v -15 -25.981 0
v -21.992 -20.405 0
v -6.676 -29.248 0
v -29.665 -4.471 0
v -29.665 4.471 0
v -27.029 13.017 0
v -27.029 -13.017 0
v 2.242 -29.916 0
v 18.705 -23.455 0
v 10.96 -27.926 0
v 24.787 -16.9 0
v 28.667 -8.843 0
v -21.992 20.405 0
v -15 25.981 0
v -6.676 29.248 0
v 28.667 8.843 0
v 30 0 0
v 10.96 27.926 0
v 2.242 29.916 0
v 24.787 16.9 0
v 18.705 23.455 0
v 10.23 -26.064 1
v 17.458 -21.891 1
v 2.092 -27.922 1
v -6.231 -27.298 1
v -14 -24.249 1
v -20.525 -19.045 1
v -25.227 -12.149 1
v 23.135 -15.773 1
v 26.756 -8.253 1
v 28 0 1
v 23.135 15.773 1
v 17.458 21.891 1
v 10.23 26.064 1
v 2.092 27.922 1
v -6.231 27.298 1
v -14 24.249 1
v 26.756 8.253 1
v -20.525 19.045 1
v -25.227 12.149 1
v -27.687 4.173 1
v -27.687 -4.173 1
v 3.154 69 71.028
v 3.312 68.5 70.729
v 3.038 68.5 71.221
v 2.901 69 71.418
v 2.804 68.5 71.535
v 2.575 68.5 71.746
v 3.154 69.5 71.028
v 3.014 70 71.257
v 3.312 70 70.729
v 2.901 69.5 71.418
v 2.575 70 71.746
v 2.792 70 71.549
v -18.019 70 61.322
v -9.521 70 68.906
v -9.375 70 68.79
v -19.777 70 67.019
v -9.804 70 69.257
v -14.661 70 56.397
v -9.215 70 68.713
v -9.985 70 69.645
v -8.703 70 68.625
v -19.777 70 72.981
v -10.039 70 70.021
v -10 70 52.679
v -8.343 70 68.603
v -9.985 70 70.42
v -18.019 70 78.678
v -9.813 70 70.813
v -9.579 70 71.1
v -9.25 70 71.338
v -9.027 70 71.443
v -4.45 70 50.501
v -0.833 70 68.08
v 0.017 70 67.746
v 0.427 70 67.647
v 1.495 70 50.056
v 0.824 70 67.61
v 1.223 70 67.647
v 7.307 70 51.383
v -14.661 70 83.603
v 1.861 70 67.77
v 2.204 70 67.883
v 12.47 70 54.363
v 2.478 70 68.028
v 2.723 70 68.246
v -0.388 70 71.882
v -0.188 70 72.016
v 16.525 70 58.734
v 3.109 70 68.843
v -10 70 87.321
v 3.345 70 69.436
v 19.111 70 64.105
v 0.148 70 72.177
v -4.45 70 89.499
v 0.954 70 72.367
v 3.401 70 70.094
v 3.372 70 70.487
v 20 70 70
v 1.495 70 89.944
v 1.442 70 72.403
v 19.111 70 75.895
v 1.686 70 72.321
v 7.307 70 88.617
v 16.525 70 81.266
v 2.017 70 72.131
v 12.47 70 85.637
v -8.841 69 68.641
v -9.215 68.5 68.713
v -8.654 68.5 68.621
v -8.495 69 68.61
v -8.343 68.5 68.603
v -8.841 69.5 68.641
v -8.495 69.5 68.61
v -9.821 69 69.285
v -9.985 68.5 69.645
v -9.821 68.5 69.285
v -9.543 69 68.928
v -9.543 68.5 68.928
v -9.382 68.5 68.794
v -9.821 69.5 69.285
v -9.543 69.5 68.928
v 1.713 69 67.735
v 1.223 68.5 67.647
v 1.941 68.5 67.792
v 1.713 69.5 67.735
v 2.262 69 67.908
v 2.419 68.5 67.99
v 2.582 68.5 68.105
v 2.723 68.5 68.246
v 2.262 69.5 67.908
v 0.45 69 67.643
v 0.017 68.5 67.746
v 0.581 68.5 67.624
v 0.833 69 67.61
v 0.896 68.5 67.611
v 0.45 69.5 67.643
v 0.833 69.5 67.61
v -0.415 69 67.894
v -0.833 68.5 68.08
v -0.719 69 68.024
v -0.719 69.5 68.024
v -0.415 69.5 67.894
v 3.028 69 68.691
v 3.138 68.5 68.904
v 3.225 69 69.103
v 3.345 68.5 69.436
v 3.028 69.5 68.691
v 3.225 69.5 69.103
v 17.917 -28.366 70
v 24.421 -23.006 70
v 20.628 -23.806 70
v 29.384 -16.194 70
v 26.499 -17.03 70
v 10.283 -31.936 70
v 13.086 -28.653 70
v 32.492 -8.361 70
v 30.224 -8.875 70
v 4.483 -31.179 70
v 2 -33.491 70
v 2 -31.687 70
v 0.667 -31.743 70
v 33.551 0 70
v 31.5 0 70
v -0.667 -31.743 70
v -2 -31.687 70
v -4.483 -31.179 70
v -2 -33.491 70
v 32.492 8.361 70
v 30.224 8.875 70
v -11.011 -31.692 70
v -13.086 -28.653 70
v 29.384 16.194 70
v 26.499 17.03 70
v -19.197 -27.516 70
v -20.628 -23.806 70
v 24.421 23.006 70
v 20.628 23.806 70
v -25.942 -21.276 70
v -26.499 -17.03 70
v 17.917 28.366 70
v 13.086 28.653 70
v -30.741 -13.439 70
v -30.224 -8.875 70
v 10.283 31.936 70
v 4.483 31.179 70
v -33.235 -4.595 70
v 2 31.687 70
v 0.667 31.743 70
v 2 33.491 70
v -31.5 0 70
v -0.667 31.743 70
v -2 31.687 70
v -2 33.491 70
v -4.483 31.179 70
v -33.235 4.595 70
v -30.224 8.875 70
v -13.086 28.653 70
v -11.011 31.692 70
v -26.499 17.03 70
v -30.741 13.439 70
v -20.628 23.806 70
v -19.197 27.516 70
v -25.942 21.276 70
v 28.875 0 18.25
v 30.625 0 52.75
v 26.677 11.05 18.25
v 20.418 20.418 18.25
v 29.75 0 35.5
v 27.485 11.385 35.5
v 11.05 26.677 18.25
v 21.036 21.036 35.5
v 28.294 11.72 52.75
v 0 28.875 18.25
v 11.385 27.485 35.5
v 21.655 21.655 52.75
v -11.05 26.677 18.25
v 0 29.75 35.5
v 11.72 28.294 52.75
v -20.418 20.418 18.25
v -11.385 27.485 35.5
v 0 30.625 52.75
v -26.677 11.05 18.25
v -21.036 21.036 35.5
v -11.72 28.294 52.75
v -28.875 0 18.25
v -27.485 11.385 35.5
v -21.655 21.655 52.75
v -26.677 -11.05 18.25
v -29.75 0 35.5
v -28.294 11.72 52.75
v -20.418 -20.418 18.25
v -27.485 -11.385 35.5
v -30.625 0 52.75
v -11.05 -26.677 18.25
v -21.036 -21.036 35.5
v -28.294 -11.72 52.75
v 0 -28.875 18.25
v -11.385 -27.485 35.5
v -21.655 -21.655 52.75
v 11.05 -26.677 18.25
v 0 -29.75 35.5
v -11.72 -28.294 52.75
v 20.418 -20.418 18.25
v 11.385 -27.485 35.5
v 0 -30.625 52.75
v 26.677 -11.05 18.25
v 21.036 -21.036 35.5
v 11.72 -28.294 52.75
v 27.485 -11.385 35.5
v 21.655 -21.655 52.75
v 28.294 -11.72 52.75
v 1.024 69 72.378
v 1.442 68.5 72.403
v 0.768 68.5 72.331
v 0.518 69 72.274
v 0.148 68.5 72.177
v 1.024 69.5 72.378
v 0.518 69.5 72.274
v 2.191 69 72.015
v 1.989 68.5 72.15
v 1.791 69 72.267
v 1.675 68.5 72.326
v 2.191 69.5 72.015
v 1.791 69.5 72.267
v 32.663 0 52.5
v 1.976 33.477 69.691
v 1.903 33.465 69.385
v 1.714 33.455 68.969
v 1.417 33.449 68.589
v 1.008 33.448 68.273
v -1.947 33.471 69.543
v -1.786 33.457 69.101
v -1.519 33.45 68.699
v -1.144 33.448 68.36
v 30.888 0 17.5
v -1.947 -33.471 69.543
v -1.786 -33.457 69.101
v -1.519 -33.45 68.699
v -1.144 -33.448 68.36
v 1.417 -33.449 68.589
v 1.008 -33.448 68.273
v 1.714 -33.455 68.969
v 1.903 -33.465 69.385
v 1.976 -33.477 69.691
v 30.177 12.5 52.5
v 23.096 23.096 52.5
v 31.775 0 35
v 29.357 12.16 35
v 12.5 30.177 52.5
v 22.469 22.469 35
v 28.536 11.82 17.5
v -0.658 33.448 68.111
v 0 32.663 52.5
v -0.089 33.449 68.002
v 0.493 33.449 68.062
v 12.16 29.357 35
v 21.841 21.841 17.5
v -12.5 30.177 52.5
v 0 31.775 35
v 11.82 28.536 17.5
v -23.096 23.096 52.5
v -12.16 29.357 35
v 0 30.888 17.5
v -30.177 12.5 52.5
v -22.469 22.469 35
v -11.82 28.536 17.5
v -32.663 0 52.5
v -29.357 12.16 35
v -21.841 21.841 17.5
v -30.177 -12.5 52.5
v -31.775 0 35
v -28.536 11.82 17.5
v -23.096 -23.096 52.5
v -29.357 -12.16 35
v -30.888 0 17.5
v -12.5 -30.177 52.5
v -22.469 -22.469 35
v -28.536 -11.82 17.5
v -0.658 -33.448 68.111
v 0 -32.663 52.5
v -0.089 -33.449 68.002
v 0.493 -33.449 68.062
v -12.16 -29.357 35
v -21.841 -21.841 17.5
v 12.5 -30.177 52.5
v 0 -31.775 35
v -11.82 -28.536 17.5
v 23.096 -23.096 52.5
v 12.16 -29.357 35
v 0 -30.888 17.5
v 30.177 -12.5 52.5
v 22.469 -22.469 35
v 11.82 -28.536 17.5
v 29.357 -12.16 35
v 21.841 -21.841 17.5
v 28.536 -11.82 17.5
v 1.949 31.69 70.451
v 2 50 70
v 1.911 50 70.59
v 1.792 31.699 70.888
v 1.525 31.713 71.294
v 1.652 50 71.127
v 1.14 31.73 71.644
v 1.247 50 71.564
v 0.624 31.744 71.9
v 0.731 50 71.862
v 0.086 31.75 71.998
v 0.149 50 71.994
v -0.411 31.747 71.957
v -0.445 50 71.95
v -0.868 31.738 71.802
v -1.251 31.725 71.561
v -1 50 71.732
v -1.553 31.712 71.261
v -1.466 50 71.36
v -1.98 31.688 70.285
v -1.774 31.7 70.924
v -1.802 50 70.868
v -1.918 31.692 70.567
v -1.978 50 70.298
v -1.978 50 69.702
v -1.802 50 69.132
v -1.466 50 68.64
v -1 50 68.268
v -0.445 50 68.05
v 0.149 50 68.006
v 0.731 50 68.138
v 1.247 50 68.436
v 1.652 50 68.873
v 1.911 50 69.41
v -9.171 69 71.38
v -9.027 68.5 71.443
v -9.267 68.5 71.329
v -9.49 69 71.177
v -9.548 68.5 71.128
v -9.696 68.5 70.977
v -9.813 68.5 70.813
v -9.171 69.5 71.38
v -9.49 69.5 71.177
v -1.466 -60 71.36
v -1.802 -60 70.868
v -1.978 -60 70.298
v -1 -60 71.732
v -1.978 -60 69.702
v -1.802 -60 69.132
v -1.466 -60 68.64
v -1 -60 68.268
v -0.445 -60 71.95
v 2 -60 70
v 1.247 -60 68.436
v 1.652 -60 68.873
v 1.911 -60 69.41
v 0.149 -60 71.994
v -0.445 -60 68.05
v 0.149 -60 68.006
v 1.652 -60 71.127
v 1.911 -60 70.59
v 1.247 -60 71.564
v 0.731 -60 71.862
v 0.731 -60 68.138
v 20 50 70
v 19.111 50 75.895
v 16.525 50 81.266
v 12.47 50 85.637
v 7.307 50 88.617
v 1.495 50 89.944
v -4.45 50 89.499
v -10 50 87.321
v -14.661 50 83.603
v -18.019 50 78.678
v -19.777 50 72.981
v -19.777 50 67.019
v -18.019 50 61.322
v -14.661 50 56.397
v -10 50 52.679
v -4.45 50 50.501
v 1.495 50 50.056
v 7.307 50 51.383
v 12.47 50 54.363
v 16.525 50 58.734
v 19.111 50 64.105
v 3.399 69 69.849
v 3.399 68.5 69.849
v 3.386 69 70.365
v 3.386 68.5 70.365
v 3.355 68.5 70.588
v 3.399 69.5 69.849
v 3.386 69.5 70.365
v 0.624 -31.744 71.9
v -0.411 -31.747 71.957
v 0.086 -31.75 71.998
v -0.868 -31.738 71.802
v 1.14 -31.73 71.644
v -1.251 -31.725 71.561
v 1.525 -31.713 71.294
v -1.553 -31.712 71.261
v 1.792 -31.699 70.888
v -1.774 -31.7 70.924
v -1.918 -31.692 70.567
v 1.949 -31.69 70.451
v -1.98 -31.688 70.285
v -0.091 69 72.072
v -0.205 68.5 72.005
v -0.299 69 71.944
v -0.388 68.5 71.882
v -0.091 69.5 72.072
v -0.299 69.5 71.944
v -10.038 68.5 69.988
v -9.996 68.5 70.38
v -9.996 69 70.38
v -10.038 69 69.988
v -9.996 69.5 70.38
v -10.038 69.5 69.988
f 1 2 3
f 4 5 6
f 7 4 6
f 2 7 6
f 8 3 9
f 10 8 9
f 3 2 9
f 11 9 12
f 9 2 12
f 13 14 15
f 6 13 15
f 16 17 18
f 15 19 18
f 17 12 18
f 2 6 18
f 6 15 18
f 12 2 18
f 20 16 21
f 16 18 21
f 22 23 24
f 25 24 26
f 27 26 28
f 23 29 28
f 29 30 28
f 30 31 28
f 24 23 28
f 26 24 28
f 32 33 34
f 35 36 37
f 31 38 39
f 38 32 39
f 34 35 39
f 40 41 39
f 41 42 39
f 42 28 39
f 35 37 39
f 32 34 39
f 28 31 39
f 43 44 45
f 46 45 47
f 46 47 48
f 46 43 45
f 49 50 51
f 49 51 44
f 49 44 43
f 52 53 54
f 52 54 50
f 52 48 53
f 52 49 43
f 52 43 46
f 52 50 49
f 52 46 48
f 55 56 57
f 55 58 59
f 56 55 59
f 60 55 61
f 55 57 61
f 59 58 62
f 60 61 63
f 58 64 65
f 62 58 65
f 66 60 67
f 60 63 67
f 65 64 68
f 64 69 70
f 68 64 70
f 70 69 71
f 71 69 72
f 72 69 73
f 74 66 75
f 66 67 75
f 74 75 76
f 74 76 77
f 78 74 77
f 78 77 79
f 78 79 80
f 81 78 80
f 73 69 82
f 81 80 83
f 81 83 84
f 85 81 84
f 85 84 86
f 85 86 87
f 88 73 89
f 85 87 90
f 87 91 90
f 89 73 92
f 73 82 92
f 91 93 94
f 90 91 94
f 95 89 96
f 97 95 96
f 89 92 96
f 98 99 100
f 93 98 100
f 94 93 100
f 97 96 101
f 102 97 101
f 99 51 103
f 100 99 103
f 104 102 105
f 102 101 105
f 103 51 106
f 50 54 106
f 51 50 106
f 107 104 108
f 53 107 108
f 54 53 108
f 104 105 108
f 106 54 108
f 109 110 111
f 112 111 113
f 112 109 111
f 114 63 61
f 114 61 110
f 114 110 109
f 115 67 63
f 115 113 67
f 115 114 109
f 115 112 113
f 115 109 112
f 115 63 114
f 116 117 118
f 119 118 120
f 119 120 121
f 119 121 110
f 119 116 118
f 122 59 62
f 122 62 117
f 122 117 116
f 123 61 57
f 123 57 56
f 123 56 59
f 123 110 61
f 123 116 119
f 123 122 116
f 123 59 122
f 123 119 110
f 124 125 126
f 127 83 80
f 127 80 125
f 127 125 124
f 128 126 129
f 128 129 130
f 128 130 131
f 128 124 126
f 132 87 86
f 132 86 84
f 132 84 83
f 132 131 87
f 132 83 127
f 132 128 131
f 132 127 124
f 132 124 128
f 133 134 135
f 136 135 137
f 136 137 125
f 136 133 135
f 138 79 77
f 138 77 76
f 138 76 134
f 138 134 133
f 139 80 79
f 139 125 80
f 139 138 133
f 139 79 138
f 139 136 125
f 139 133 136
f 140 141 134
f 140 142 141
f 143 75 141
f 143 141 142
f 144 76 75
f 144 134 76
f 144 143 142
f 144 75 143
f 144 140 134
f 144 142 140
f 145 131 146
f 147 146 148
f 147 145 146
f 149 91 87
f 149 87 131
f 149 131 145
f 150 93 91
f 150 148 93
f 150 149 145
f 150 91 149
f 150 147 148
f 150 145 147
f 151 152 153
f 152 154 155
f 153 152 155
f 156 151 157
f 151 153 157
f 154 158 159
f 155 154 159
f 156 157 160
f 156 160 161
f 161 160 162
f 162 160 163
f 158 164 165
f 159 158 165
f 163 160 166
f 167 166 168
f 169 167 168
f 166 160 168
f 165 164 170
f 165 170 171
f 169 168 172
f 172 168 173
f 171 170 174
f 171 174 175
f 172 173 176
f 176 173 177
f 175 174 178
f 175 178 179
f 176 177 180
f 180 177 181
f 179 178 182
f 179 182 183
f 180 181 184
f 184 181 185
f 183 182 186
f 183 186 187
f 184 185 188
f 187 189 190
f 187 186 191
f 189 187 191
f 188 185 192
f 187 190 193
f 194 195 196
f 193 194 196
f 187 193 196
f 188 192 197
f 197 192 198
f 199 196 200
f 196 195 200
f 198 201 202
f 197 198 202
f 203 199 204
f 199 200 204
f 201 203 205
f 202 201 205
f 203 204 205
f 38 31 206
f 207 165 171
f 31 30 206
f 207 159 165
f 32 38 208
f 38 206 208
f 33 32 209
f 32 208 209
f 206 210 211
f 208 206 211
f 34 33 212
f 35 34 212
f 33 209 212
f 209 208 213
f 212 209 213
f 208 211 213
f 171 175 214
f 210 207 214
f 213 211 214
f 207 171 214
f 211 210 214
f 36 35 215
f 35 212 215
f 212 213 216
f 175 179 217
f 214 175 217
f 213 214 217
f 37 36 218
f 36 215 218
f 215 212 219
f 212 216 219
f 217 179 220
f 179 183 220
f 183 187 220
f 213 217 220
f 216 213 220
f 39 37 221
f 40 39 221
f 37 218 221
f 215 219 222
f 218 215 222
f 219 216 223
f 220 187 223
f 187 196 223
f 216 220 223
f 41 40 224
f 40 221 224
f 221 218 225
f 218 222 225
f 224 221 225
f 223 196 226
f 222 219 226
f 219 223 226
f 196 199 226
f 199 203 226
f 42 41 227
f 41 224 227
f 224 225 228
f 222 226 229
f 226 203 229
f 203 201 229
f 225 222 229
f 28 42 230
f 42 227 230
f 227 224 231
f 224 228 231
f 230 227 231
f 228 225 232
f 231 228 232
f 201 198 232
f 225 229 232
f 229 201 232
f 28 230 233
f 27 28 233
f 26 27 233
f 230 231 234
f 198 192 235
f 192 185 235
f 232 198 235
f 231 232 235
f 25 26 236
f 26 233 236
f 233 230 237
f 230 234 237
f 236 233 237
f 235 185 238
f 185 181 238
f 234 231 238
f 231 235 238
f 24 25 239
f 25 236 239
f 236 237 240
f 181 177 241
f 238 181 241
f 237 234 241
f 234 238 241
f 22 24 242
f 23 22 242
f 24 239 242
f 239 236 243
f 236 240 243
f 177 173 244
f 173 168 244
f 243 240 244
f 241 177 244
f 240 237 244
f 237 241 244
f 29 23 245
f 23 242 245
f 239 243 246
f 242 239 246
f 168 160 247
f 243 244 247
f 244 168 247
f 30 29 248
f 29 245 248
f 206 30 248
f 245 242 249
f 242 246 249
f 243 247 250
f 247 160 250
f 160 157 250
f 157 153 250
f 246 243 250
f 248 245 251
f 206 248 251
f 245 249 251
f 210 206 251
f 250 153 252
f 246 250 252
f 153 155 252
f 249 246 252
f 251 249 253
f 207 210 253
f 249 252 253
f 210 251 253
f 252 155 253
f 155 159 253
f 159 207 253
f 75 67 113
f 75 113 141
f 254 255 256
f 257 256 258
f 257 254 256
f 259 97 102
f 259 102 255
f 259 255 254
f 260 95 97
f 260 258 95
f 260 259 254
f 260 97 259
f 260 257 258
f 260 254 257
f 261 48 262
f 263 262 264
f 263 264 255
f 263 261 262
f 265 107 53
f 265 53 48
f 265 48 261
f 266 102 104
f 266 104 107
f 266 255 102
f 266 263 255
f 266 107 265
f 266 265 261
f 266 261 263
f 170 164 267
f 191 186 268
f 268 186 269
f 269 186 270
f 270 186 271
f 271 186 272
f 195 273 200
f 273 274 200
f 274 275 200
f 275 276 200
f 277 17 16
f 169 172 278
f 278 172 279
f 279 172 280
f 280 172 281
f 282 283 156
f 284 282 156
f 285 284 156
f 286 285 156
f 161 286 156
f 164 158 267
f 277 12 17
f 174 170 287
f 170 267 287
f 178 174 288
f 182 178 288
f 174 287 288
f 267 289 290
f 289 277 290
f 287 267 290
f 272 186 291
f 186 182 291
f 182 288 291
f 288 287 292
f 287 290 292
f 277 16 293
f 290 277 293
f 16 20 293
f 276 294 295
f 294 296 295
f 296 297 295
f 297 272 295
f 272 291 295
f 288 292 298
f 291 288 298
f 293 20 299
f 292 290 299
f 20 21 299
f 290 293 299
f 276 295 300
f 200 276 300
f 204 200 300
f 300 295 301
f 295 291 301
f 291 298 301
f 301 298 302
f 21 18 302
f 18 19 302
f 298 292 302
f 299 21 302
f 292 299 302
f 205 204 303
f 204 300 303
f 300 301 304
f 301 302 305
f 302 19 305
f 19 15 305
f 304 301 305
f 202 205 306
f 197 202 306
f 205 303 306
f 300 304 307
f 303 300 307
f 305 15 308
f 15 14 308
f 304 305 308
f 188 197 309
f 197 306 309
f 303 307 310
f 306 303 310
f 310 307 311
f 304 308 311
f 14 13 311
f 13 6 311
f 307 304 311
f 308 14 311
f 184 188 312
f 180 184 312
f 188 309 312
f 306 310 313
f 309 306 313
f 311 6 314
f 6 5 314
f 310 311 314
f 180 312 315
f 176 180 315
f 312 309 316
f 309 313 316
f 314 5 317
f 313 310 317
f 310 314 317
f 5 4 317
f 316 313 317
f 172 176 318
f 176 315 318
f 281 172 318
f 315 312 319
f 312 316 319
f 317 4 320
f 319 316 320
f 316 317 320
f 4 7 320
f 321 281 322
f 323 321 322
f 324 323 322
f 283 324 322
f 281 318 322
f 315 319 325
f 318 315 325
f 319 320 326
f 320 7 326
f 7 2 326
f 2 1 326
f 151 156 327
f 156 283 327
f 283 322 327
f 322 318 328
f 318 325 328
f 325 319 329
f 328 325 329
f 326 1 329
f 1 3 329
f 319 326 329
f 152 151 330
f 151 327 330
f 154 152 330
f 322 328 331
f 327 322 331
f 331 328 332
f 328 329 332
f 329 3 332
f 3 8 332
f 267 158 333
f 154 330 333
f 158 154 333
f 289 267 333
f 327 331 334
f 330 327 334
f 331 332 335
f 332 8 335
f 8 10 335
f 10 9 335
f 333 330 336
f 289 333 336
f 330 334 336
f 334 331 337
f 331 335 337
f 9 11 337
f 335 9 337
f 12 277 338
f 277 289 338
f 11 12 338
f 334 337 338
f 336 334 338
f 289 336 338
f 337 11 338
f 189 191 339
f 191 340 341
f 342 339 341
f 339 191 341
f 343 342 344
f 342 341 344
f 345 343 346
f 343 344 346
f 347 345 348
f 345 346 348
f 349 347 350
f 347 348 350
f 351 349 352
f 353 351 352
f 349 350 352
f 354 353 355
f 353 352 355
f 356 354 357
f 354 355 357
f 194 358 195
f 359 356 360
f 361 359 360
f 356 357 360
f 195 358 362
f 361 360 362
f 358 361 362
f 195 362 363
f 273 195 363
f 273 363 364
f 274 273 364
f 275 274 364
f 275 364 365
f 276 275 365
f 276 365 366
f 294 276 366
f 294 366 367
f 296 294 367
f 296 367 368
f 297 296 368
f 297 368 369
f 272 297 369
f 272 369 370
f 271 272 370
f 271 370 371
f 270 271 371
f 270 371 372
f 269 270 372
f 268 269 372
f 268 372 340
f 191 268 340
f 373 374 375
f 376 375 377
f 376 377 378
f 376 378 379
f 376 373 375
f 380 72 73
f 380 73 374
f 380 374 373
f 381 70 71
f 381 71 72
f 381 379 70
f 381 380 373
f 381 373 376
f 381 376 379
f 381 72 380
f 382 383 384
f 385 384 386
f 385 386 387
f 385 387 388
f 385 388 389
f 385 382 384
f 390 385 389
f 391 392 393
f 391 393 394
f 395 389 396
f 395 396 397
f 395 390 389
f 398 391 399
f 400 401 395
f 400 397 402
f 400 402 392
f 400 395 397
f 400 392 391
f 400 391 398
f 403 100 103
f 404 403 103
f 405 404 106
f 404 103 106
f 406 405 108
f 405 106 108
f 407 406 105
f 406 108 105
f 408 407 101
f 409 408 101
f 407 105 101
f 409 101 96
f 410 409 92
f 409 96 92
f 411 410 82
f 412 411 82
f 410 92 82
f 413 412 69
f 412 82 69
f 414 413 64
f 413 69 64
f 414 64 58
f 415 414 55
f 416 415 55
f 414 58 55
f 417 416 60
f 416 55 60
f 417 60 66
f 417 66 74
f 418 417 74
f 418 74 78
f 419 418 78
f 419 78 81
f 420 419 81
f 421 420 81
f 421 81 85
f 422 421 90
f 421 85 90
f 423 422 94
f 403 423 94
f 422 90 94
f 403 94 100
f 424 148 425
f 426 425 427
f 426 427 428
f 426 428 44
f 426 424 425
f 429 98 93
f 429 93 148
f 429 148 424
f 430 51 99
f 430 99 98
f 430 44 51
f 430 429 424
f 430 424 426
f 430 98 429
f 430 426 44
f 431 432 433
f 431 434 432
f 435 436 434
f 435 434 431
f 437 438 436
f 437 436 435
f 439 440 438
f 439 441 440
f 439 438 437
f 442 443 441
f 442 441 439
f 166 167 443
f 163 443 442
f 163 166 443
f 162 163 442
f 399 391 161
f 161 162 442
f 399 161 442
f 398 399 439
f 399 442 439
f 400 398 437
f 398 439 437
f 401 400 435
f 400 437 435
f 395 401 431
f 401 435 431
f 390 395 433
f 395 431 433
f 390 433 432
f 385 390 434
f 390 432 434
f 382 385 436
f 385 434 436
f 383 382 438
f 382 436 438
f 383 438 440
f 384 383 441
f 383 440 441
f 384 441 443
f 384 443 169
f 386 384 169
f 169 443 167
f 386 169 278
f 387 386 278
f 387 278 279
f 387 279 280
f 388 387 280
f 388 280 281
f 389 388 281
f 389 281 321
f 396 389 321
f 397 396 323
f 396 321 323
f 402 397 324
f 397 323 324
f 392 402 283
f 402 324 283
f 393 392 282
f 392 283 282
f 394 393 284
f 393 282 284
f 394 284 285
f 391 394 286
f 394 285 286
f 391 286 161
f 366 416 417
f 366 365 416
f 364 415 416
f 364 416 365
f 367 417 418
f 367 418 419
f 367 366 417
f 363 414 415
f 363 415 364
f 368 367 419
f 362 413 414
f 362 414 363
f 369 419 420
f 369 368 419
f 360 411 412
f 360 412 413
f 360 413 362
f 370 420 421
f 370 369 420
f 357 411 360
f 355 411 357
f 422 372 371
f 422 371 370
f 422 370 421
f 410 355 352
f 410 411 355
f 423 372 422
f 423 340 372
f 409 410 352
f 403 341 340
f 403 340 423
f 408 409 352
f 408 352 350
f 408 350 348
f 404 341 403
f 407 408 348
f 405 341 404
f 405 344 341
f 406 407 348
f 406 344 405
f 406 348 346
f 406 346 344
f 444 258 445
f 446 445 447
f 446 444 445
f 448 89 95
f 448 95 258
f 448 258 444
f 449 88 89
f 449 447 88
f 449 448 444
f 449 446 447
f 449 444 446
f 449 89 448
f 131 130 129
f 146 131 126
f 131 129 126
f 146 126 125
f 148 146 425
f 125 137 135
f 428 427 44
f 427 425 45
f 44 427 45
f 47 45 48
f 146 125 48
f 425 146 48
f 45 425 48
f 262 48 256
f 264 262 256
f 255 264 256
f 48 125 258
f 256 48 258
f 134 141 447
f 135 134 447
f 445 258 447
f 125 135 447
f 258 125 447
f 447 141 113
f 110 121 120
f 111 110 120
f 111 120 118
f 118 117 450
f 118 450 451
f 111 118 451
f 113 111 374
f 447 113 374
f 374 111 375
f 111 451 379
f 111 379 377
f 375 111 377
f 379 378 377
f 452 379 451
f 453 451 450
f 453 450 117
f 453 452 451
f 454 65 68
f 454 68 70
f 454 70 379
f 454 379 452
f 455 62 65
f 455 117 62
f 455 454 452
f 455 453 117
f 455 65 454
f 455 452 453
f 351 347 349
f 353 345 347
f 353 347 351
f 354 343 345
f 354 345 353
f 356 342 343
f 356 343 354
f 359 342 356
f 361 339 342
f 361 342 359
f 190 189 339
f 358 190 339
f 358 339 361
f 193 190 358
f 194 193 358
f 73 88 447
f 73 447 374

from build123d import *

# Parameters (mm, degrees)
EXTRUDE_DEPTH           = 4.5
EXTRUDE_PLACEMENT_ANGLE = 90
CYLINDER004_R           = 31.75
CYLINDER004_DEPTH       = 30
CYLINDER003_R           = 2
CYLINDER003_DEPTH       = 120
CYLINDER005_R           = 20
CYLINDER005_DEPTH       = 20


with BuildPart() as corona_servo:
    # path2399 → Extrude (new body)
    with BuildSketch(Plane(origin=(8.682374, -4.98127, 0), x_dir=(0, 1, 0), z_dir=(0, 0, 1))):
        with BuildLine():
            add(Edge.make_bspline(
                [(-1.415579, 5.024931), (-1.938341, -2.484397)],
                knots=[0, 0, 7.527502, 7.527502], degree=1))
            add(Edge.make_bspline(
                [(-1.938341, -2.484397), (-1.938341, -2.484397), (-2.134903, -2.858259), (-2.273136, -3.334737)],
                knots=[0, 0, 0, 0, 1, 1, 1, 1], degree=3))
            add(Edge.make_bspline(
                [(-2.273136, -3.334737), (-2.411369, -3.811216), (-2.443203, -4.128926), (-2.371685, -4.540758)],
                knots=[0, 0, 0, 0, 1, 1, 1, 1], degree=3))
            add(Edge.make_bspline(
                [(-2.371685, -4.540758), (-2.300167, -4.952591), (-2.218933, -5.672599), (-1.772797, -6.040394)],
                knots=[0, 0, 0, 0, 1, 1, 1, 1], degree=3))
            add(Edge.make_bspline(
                [(-1.772797, -6.040394), (-1.326661, -6.40819), (-0.861351, -6.572675), (-0.583202, -6.662312)],
                knots=[0, 0, 0, 0, 1, 1, 1, 1], degree=3))
            add(Edge.make_bspline(
                [(-0.583202, -6.662312), (-0.305053, -6.751952), (0.507781, -6.731952), (0.709843, -6.630052)],
                knots=[0, 0, 0, 0, 1, 1, 1, 1], degree=3))
            add(Edge.make_bspline(
                [(0.709843, -6.630052), (0.911905, -6.52815), (1.481843, -6.245909), (1.726833, -5.892641)],
                knots=[0, 0, 0, 0, 1, 1, 1, 1], degree=3))
            add(Edge.make_bspline(
                [(1.726833, -5.892641), (1.971823, -5.539373), (2.340182, -5.059724), (2.384256, -4.759981)],
                knots=[0, 0, 0, 0, 1, 1, 1, 1], degree=3))
            add(Edge.make_bspline(
                [(2.384256, -4.759981), (2.42833, -4.460237), (2.223091, -3.691858), (2.158411, -3.465999)],
                knots=[0, 0, 0, 0, 1, 1, 1, 1], degree=3))
            add(Edge.make_bspline(
                [(2.158411, -3.465999), (2.093732, -3.240141), (1.863634, -2.929328), (1.863634, -2.929328)],
                knots=[0, 0, 0, 0, 1, 1, 1, 1], degree=3))
            add(Edge.make_bspline(
                [(1.863634, -2.929328), (1.423808, 5.709855)],
                knots=[0, 0, 8.650371, 8.650371], degree=1))
            add(Edge.make_bspline(
                [(1.423808, 5.709855), (1.423808, 5.709855), (1.246198, 6.226563), (0.794563, 6.495307)],
                knots=[0, 0, 0, 0, 1, 1, 1, 1], degree=3))
            add(Edge.make_bspline(
                [(0.794563, 6.495307), (0.342929, 6.764051), (-0.057622, 6.753041), (-0.37358, 6.666974)],
                knots=[0, 0, 0, 0, 1, 1, 1, 1], degree=3))
            add(Edge.make_bspline(
                [(-0.37358, 6.666974), (-0.689538, 6.580907), (-1.208145, 6.230265), (-1.306201, 5.897514)],
                knots=[0, 0, 0, 0, 1, 1, 1, 1], degree=3))
            add(Edge.make_bspline(
                [(-1.306201, 5.897514), (-1.404257, 5.564763), (-1.415579, 5.024931), (-1.415579, 5.024931)],
                knots=[0, 0, 0, 0, 1, 1, 1, 1], degree=3))
        make_face()
    extrude(amount=EXTRUDE_DEPTH)


with BuildPart() as corona_servo_1:
    # Extrude placement: moved
    add(corona_servo.part.moved(Location((-12, 73, 75))).rotate(Axis((-12, 73, 75), (1, 0, 0)), EXTRUDE_PLACEMENT_ANGLE))


with BuildPart() as vaso:
    # Sketch → Revolution (revolve)
    with BuildSketch(Plane.XZ):
        Polygon((0, 1), (28, 1), (31.5, 70), (33.550725, 70), (30, 0), (0, 0), align=None)
    revolve(axis=Axis((0, 0, 0), (0, 0, 1)))


with BuildPart() as cylinder004:
    # Cylinder004 → Cylinder004 (new body)
    with BuildSketch(Plane.XY.offset(56)):
        Circle(CYLINDER004_R)
    extrude(amount=CYLINDER004_DEPTH)


with BuildPart() as cut001:
    # Cylinder003 → Cylinder003 (new body)
    with BuildSketch(Plane(origin=(0, 60, 70), x_dir=(1, 0, 0), z_dir=(0, -1, 0))):
        Circle(CYLINDER003_R)
    extrude(amount=CYLINDER003_DEPTH)

    # Cut001: cut Cylinder004
    add(cylinder004.part, mode=Mode.SUBTRACT)


with BuildPart() as cut:
    # Cylinder005 → Cylinder005 (new body)
    with BuildSketch(Plane(origin=(0, 70, 70), x_dir=(1, 0, 0), z_dir=(0, -1, 0))):
        Circle(CYLINDER005_R)
    extrude(amount=CYLINDER005_DEPTH)

    # Fusion: union Cut001
    add(cut001.part)

    # Fusion001: union vaso
    add(vaso.part)

    # Cut: cut corona_servo
    add(corona_servo_1.part, mode=Mode.SUBTRACT)


solid = cut.part
